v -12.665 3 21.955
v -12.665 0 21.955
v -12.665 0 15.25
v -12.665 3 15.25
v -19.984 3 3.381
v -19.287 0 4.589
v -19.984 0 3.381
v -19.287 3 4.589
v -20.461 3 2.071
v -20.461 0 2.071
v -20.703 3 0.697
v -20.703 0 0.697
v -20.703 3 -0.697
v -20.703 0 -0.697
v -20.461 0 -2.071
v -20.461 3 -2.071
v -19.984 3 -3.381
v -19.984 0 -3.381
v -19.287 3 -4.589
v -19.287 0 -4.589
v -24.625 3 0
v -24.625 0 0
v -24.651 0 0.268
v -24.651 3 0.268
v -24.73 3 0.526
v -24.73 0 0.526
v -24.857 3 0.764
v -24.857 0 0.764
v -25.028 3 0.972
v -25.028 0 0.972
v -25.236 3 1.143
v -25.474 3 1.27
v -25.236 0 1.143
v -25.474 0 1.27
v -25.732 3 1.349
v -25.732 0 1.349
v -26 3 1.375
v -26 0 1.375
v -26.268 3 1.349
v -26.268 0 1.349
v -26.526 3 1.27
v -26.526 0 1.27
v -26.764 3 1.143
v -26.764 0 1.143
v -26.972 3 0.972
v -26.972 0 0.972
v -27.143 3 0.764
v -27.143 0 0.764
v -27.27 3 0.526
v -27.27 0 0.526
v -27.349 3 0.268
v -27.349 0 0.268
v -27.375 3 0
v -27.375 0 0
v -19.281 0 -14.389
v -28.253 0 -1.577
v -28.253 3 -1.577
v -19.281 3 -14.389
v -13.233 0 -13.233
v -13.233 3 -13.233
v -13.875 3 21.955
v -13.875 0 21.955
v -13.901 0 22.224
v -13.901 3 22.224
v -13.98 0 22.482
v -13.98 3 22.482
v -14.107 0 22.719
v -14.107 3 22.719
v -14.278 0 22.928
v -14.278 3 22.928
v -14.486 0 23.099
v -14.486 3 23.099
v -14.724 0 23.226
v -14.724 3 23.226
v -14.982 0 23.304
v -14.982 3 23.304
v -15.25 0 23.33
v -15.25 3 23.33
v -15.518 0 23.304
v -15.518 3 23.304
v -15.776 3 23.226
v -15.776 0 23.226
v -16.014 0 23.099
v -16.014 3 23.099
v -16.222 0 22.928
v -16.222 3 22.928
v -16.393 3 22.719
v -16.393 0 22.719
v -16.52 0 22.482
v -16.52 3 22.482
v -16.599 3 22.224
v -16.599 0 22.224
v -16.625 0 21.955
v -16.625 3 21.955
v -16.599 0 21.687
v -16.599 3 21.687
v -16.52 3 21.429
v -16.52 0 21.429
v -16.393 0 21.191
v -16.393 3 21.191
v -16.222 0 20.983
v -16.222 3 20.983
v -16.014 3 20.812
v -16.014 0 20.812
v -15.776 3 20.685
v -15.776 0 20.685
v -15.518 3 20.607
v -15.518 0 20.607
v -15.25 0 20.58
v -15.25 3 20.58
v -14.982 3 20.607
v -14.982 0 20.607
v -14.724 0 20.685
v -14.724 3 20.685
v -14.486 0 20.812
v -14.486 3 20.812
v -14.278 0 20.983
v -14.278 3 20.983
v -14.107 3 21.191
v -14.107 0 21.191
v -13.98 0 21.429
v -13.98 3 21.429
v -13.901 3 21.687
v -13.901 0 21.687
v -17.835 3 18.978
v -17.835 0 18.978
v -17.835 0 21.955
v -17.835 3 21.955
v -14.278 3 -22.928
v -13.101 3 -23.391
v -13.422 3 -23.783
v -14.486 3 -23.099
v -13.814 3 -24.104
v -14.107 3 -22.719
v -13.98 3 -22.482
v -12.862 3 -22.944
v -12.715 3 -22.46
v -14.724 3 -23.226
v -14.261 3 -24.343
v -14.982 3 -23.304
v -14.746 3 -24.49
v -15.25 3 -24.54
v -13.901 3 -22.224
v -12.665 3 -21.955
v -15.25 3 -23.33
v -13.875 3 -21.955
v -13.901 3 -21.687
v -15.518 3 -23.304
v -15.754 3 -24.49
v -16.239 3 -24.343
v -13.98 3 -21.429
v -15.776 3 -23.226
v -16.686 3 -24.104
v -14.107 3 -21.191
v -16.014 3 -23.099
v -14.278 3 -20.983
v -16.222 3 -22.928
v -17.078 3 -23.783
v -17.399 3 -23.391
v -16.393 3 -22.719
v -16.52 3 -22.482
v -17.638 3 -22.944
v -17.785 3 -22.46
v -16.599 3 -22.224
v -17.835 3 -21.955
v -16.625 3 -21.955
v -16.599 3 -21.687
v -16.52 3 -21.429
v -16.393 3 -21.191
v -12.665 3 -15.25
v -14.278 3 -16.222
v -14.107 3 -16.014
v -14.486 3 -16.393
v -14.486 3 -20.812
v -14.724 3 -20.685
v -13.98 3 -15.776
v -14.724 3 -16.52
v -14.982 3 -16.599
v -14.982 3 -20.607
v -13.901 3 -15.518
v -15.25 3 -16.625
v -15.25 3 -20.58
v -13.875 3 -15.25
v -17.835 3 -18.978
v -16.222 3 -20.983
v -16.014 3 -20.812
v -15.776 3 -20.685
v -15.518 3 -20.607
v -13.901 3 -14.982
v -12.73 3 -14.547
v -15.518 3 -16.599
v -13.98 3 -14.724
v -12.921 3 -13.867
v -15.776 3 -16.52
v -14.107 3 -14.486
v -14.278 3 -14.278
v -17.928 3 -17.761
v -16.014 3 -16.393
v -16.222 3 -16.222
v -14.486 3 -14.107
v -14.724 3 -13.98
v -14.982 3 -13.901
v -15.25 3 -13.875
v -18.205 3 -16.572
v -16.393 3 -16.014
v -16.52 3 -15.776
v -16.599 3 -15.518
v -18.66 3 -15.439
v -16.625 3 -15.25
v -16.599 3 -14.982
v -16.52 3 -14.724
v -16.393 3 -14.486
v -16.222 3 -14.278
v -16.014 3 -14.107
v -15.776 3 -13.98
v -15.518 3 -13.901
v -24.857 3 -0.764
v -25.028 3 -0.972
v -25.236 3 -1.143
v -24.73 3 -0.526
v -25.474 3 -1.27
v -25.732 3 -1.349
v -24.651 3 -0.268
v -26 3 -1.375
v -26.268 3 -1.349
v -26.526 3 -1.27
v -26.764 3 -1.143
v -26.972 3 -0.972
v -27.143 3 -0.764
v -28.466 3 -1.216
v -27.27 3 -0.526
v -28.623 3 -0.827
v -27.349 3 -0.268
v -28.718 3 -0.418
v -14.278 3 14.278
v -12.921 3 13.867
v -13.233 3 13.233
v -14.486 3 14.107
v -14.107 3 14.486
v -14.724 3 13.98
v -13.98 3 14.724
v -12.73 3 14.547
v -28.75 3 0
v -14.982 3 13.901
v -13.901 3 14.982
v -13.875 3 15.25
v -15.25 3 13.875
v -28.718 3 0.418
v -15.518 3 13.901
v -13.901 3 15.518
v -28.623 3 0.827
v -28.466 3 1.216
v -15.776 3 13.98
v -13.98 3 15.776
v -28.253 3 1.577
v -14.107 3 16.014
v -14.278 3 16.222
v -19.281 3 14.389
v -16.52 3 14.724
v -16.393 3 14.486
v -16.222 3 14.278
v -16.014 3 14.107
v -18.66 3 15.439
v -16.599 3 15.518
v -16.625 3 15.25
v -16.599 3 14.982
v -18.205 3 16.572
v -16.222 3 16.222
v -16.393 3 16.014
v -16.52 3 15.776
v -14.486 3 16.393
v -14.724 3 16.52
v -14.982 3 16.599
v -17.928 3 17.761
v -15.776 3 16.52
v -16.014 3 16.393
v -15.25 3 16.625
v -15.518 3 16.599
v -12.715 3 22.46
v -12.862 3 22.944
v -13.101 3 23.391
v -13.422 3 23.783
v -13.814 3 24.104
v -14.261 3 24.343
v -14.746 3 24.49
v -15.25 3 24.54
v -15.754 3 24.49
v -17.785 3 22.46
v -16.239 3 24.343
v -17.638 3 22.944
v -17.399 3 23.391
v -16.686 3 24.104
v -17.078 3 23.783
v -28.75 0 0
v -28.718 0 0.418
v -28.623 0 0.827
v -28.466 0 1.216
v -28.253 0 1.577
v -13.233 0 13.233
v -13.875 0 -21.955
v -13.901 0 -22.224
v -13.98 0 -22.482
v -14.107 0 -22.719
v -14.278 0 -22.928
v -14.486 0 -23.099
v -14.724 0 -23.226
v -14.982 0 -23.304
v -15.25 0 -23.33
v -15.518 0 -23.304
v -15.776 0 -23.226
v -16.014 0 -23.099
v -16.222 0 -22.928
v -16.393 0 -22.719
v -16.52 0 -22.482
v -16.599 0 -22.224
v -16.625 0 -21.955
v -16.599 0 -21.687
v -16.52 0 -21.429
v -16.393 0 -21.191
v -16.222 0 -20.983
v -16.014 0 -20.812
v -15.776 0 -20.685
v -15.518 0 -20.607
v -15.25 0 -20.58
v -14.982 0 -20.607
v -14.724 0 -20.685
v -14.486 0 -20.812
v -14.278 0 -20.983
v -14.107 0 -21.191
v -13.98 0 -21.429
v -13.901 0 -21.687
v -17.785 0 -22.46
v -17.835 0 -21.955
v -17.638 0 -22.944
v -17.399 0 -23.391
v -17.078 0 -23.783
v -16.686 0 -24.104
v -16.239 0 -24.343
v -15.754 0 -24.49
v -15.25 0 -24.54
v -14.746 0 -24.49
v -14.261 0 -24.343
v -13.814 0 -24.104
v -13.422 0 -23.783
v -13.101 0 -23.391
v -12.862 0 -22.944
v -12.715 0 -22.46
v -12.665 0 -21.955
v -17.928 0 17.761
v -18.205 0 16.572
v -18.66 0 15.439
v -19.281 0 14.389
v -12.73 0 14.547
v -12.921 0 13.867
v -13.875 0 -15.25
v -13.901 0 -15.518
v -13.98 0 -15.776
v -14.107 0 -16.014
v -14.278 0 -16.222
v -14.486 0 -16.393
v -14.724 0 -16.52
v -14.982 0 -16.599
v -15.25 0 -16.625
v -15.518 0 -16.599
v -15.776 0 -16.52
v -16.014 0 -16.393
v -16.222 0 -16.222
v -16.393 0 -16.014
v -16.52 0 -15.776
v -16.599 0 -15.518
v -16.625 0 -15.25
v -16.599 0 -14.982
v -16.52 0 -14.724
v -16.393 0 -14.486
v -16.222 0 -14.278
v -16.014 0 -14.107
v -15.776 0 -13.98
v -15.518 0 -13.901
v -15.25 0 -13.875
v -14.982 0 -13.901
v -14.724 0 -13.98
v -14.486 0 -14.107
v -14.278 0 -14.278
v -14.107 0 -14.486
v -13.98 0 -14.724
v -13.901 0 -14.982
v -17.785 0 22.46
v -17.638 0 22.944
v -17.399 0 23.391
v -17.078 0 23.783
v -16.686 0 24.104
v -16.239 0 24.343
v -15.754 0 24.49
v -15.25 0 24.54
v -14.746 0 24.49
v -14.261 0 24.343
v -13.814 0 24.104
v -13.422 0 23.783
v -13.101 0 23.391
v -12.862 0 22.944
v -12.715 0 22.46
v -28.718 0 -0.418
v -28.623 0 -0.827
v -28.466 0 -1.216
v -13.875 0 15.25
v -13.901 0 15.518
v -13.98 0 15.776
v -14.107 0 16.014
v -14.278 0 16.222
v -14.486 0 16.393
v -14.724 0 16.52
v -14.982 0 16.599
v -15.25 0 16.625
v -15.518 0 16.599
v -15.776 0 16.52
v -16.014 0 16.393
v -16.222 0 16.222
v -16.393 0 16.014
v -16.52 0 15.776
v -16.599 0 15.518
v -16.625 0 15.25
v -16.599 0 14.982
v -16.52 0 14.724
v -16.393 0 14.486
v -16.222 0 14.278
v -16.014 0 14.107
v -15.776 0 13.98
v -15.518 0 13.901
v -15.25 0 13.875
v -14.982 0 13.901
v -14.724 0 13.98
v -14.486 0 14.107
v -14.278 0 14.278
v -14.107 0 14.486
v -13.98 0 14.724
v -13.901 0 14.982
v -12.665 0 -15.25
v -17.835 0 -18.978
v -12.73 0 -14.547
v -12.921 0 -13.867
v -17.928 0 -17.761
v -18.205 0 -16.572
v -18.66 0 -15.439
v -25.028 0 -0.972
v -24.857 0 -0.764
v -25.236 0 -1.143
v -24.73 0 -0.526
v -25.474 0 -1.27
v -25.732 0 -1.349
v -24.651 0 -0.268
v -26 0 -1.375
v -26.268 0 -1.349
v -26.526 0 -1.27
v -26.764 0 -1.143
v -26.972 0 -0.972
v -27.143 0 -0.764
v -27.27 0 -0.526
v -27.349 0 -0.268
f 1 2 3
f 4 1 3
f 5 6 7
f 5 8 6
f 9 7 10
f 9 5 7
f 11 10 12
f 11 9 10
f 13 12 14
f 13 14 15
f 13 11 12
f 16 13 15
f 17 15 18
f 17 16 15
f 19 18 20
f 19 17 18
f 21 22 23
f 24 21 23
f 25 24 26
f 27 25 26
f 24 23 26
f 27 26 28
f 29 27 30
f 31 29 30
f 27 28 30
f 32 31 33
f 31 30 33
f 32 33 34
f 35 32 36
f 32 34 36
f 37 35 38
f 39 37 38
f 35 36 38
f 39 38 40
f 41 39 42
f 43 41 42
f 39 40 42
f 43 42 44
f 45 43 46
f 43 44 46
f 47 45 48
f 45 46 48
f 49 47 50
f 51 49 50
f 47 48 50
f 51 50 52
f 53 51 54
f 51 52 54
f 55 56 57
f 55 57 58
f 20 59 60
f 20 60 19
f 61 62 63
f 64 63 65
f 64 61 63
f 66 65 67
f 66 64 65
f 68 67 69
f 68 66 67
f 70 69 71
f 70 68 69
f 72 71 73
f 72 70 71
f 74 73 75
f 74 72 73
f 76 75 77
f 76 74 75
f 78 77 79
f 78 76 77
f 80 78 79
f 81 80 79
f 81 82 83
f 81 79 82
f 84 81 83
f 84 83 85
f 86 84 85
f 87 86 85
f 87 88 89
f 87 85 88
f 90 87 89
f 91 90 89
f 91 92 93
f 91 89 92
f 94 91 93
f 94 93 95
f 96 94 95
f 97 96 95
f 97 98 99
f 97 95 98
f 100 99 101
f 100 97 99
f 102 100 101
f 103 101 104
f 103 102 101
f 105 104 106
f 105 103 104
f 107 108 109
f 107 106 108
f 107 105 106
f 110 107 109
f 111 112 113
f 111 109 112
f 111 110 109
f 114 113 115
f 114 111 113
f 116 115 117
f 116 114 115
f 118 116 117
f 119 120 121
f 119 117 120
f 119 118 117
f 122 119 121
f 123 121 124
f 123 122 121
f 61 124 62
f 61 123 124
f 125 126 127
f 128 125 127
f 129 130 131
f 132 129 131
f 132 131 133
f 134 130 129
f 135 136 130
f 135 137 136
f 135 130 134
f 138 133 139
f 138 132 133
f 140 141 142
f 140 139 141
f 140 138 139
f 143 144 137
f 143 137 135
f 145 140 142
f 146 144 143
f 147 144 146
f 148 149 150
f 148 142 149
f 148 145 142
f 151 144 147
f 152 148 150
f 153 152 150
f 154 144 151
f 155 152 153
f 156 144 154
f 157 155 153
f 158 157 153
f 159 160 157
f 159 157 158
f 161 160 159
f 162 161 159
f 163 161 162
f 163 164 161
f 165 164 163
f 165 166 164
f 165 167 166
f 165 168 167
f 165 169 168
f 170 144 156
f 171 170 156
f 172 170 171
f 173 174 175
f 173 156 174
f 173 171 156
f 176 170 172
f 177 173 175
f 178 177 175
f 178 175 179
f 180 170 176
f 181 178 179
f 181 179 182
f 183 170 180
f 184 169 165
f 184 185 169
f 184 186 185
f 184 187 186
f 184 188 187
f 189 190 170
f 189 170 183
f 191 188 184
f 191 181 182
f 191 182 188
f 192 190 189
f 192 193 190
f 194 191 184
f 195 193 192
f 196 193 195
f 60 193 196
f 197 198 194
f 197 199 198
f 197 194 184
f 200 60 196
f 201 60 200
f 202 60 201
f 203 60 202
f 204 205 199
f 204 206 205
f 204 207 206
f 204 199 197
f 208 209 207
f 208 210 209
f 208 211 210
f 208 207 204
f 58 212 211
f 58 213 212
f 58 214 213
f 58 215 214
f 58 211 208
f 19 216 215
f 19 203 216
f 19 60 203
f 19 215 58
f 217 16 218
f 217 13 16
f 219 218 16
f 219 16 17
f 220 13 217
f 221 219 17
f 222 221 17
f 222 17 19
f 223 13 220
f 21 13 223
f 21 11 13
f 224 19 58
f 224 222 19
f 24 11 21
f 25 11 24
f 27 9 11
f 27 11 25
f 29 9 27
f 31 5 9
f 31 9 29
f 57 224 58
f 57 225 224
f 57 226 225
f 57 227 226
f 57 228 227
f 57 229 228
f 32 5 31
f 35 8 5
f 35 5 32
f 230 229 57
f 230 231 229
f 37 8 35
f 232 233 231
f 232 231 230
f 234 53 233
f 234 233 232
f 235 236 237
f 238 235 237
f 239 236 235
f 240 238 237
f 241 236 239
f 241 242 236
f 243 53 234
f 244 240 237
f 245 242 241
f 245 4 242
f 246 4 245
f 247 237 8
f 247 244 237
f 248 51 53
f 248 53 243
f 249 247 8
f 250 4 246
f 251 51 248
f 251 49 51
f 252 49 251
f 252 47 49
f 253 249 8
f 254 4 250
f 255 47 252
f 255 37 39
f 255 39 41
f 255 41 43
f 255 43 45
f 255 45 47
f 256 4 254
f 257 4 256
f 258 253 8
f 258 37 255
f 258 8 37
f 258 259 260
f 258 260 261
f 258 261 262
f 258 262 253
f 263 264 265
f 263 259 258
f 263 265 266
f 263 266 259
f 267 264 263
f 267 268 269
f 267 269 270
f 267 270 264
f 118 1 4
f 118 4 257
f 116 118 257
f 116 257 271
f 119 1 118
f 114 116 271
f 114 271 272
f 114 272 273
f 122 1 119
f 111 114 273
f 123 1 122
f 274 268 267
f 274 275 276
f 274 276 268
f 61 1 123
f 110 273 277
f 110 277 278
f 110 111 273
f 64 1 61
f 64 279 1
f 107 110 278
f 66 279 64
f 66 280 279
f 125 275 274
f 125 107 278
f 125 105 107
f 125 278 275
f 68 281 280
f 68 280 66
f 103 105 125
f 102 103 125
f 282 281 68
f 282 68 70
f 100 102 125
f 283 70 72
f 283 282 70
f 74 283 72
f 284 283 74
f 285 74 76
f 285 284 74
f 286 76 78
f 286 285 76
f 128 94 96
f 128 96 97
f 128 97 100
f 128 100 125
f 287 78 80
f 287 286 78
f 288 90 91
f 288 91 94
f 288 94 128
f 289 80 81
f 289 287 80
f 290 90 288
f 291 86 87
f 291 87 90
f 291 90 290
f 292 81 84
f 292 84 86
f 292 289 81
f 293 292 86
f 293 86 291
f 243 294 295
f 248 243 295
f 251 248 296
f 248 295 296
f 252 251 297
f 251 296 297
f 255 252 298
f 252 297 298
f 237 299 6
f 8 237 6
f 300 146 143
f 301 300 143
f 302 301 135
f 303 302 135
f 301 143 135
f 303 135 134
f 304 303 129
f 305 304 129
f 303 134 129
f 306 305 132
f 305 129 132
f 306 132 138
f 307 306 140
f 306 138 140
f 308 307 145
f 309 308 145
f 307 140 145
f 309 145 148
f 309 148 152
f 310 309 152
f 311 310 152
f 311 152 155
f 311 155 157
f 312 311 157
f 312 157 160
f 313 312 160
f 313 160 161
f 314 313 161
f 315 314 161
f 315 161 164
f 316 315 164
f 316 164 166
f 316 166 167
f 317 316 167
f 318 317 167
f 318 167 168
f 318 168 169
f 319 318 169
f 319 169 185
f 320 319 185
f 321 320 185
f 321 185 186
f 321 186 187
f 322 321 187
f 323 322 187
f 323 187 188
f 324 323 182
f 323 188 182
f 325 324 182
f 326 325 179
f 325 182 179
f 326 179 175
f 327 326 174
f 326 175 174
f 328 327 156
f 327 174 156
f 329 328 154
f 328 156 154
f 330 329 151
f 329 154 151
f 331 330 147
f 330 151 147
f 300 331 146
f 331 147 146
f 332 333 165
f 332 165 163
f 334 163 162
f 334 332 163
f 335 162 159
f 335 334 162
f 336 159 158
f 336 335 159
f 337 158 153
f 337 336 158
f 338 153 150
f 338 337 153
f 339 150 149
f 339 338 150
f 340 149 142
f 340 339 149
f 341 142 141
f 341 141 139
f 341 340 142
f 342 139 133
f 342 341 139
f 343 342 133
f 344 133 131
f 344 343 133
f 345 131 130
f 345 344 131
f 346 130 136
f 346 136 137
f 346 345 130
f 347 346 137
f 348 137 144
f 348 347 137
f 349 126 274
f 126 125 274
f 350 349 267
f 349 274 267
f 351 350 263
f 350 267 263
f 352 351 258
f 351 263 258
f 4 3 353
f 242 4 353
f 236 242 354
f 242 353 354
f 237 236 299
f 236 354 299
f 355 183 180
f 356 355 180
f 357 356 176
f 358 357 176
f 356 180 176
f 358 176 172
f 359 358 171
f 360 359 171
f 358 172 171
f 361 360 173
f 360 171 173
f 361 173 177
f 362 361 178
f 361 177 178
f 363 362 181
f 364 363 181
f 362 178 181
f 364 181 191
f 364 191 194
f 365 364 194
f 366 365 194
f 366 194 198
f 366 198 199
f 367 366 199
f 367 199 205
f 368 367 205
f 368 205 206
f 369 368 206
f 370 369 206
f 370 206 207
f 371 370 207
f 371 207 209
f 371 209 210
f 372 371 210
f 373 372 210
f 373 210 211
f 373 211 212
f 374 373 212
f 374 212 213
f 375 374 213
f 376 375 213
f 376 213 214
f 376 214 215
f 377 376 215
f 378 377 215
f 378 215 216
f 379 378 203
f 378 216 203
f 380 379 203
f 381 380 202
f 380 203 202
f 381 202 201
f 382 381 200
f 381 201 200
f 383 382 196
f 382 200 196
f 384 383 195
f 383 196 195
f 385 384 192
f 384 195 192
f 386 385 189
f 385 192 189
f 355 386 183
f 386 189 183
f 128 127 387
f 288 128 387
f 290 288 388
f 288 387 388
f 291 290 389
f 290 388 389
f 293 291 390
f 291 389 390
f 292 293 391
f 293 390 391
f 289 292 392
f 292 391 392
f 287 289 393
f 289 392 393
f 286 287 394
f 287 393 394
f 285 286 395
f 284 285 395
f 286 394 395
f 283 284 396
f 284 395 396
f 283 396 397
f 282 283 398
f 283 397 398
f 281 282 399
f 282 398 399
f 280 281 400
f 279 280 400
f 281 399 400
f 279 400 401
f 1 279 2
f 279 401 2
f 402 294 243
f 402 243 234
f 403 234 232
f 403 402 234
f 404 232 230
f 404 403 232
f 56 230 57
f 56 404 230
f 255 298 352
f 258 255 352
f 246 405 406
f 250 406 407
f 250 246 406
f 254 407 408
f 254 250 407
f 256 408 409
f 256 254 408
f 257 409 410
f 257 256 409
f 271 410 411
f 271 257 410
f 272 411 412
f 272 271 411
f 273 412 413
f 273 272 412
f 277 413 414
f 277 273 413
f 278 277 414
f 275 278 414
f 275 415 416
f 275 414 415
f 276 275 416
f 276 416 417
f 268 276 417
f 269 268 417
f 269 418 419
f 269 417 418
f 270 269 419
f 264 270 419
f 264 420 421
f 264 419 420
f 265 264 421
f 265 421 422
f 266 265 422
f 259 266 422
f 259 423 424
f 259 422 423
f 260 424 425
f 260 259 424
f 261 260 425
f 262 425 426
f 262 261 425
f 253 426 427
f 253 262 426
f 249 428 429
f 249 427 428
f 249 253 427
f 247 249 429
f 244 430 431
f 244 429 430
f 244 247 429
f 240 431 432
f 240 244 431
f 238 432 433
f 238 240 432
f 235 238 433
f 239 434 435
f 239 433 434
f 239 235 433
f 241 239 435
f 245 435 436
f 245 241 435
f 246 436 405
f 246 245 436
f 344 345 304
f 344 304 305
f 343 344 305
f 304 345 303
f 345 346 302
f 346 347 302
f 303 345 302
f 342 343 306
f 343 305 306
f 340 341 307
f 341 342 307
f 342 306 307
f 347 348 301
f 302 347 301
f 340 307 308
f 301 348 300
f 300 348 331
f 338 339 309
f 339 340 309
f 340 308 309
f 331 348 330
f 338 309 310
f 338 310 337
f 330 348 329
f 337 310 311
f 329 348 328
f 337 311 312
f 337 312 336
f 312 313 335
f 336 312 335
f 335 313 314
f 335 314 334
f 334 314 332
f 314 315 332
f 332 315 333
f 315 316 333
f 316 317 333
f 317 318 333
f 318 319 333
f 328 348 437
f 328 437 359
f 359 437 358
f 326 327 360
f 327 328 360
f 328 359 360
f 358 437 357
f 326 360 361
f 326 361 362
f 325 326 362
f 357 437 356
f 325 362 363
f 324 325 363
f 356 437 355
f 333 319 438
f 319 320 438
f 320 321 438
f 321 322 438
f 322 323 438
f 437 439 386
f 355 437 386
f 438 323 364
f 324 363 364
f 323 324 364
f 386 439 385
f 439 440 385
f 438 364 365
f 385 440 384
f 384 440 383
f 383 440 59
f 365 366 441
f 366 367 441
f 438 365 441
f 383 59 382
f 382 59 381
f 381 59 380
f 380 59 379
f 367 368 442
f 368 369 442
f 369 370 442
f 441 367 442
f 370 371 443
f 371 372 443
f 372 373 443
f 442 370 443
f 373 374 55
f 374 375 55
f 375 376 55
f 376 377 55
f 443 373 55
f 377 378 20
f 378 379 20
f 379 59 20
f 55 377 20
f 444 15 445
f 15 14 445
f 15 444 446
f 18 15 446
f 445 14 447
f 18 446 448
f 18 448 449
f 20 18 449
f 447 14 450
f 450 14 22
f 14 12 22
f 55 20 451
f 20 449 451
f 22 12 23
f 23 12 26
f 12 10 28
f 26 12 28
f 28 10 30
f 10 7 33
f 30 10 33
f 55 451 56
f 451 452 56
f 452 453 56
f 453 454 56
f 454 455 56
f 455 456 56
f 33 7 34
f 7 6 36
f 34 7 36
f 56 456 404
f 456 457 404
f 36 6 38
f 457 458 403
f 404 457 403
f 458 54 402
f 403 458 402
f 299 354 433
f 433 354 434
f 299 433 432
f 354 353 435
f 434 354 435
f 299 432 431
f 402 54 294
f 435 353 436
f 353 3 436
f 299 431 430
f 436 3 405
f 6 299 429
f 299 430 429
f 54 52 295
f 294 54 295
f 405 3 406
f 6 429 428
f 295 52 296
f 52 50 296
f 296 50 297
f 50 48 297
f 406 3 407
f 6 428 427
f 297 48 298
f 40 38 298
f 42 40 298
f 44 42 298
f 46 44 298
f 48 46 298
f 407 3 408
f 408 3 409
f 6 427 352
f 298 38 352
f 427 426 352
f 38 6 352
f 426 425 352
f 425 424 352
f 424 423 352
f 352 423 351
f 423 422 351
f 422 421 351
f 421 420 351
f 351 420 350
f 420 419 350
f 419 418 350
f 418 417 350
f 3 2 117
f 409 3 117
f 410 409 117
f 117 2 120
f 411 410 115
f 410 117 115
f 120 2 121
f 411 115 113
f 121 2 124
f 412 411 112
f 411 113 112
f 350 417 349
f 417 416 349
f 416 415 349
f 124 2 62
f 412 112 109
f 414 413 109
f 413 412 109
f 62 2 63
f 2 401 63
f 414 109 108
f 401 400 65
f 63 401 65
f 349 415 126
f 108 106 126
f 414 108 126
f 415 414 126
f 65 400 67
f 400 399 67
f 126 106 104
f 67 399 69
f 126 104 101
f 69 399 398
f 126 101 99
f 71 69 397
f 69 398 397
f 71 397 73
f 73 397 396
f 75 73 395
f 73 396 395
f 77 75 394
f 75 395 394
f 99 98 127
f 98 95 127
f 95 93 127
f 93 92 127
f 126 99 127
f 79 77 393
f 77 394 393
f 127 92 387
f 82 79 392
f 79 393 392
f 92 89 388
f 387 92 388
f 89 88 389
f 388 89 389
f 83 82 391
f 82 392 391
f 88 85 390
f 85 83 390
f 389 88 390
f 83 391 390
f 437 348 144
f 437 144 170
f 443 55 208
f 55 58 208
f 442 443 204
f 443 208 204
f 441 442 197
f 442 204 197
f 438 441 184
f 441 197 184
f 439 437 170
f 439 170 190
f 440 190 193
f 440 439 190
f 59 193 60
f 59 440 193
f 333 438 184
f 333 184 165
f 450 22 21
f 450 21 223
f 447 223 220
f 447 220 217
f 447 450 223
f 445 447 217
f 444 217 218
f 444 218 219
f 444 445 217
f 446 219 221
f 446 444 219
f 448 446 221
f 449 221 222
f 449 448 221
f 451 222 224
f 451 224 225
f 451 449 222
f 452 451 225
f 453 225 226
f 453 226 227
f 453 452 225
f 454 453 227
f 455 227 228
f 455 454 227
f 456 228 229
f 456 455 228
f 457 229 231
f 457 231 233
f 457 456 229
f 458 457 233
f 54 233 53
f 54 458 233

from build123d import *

# Parameters (mm, degrees)
BOSS_EXTRUDE1_DEPTH = 3
SKETCH3_R           = 1.375
CUT_EXTRUDE1_DEPTH  = 4
FILLET1_R           = 8


with BuildPart() as part:
    # Sketch2 → Boss-Extrude1 (new body)
    with BuildSketch(Plane(origin=(0, 0, 0), x_dir=(1, 0, 0), z_dir=(0, 1, 0))):
        with BuildLine():
            Line((-12.66542378, 21.955324516), (-12.66542378, 15.25))
            ThreePointArc((-12.66542378, 15.25), (-12.810144222, 14.202492305), (-13.233463188, 13.233463188))
            Line((-13.233463188, 13.233463188), (-22.5, 0))
            Line((-22.5, 0), (-24.625, 0))
            ThreePointArc((-24.625, 0), (-26, 1.375), (-27.375, 0))
            Line((-27.375, 0), (-28.75, 0))
            ThreePointArc((-28.75, 0), (-28.622713939, 0.826965294), (-28.252638839, 1.57737702))
            Line((-28.252638839, 1.57737702), (-17.83457622, 16.455324516))
            Line((-17.83457622, 16.455324516), (-17.83457622, 21.955324516))
            ThreePointArc((-17.83457622, 21.955324516), (-15.25, 24.539900736), (-12.66542378, 21.955324516))
        make_face()
    boss_extrude1 = extrude(amount=BOSS_EXTRUDE1_DEPTH)

    # Sketch3 → Cut-Extrude1 (cut, through all)
    with BuildSketch(Plane(origin=(0, 3, 0), x_dir=(1, 0, 0), z_dir=(0, 1, 0))):
        with Locations((-15.25, 15.25)):
            Circle(SKETCH3_R)
        with Locations((-15.25, 21.955324516)):
            Circle(SKETCH3_R)
    cut_extrude1 = extrude(amount=-CUT_EXTRUDE1_DEPTH, mode=Mode.SUBTRACT)

    # Mirror2: Boss-Extrude1, Cut-Extrude1 across plane
    add(boss_extrude1.mirror(Plane(origin=(-22.5, 3, 0), x_dir=(1, 0, 0), z_dir=(0, 0, -1))))
    add(cut_extrude1.mirror(Plane(origin=(-22.5, 3, 0), x_dir=(1, 0, 0), z_dir=(0, 0, -1))), mode=Mode.SUBTRACT)

    # Fillet1
    fillet1_edges = [part.edges().sort_by_distance(p)[0] for p in [
        (-17.83457622, 1.5, -16.455324516),
        (-22.5, 1.5, 0),
        (-17.83457622, 1.5, 16.455324516),
    ]]
    fillet(fillet1_edges, radius=FILLET1_R)


solid = part.part
